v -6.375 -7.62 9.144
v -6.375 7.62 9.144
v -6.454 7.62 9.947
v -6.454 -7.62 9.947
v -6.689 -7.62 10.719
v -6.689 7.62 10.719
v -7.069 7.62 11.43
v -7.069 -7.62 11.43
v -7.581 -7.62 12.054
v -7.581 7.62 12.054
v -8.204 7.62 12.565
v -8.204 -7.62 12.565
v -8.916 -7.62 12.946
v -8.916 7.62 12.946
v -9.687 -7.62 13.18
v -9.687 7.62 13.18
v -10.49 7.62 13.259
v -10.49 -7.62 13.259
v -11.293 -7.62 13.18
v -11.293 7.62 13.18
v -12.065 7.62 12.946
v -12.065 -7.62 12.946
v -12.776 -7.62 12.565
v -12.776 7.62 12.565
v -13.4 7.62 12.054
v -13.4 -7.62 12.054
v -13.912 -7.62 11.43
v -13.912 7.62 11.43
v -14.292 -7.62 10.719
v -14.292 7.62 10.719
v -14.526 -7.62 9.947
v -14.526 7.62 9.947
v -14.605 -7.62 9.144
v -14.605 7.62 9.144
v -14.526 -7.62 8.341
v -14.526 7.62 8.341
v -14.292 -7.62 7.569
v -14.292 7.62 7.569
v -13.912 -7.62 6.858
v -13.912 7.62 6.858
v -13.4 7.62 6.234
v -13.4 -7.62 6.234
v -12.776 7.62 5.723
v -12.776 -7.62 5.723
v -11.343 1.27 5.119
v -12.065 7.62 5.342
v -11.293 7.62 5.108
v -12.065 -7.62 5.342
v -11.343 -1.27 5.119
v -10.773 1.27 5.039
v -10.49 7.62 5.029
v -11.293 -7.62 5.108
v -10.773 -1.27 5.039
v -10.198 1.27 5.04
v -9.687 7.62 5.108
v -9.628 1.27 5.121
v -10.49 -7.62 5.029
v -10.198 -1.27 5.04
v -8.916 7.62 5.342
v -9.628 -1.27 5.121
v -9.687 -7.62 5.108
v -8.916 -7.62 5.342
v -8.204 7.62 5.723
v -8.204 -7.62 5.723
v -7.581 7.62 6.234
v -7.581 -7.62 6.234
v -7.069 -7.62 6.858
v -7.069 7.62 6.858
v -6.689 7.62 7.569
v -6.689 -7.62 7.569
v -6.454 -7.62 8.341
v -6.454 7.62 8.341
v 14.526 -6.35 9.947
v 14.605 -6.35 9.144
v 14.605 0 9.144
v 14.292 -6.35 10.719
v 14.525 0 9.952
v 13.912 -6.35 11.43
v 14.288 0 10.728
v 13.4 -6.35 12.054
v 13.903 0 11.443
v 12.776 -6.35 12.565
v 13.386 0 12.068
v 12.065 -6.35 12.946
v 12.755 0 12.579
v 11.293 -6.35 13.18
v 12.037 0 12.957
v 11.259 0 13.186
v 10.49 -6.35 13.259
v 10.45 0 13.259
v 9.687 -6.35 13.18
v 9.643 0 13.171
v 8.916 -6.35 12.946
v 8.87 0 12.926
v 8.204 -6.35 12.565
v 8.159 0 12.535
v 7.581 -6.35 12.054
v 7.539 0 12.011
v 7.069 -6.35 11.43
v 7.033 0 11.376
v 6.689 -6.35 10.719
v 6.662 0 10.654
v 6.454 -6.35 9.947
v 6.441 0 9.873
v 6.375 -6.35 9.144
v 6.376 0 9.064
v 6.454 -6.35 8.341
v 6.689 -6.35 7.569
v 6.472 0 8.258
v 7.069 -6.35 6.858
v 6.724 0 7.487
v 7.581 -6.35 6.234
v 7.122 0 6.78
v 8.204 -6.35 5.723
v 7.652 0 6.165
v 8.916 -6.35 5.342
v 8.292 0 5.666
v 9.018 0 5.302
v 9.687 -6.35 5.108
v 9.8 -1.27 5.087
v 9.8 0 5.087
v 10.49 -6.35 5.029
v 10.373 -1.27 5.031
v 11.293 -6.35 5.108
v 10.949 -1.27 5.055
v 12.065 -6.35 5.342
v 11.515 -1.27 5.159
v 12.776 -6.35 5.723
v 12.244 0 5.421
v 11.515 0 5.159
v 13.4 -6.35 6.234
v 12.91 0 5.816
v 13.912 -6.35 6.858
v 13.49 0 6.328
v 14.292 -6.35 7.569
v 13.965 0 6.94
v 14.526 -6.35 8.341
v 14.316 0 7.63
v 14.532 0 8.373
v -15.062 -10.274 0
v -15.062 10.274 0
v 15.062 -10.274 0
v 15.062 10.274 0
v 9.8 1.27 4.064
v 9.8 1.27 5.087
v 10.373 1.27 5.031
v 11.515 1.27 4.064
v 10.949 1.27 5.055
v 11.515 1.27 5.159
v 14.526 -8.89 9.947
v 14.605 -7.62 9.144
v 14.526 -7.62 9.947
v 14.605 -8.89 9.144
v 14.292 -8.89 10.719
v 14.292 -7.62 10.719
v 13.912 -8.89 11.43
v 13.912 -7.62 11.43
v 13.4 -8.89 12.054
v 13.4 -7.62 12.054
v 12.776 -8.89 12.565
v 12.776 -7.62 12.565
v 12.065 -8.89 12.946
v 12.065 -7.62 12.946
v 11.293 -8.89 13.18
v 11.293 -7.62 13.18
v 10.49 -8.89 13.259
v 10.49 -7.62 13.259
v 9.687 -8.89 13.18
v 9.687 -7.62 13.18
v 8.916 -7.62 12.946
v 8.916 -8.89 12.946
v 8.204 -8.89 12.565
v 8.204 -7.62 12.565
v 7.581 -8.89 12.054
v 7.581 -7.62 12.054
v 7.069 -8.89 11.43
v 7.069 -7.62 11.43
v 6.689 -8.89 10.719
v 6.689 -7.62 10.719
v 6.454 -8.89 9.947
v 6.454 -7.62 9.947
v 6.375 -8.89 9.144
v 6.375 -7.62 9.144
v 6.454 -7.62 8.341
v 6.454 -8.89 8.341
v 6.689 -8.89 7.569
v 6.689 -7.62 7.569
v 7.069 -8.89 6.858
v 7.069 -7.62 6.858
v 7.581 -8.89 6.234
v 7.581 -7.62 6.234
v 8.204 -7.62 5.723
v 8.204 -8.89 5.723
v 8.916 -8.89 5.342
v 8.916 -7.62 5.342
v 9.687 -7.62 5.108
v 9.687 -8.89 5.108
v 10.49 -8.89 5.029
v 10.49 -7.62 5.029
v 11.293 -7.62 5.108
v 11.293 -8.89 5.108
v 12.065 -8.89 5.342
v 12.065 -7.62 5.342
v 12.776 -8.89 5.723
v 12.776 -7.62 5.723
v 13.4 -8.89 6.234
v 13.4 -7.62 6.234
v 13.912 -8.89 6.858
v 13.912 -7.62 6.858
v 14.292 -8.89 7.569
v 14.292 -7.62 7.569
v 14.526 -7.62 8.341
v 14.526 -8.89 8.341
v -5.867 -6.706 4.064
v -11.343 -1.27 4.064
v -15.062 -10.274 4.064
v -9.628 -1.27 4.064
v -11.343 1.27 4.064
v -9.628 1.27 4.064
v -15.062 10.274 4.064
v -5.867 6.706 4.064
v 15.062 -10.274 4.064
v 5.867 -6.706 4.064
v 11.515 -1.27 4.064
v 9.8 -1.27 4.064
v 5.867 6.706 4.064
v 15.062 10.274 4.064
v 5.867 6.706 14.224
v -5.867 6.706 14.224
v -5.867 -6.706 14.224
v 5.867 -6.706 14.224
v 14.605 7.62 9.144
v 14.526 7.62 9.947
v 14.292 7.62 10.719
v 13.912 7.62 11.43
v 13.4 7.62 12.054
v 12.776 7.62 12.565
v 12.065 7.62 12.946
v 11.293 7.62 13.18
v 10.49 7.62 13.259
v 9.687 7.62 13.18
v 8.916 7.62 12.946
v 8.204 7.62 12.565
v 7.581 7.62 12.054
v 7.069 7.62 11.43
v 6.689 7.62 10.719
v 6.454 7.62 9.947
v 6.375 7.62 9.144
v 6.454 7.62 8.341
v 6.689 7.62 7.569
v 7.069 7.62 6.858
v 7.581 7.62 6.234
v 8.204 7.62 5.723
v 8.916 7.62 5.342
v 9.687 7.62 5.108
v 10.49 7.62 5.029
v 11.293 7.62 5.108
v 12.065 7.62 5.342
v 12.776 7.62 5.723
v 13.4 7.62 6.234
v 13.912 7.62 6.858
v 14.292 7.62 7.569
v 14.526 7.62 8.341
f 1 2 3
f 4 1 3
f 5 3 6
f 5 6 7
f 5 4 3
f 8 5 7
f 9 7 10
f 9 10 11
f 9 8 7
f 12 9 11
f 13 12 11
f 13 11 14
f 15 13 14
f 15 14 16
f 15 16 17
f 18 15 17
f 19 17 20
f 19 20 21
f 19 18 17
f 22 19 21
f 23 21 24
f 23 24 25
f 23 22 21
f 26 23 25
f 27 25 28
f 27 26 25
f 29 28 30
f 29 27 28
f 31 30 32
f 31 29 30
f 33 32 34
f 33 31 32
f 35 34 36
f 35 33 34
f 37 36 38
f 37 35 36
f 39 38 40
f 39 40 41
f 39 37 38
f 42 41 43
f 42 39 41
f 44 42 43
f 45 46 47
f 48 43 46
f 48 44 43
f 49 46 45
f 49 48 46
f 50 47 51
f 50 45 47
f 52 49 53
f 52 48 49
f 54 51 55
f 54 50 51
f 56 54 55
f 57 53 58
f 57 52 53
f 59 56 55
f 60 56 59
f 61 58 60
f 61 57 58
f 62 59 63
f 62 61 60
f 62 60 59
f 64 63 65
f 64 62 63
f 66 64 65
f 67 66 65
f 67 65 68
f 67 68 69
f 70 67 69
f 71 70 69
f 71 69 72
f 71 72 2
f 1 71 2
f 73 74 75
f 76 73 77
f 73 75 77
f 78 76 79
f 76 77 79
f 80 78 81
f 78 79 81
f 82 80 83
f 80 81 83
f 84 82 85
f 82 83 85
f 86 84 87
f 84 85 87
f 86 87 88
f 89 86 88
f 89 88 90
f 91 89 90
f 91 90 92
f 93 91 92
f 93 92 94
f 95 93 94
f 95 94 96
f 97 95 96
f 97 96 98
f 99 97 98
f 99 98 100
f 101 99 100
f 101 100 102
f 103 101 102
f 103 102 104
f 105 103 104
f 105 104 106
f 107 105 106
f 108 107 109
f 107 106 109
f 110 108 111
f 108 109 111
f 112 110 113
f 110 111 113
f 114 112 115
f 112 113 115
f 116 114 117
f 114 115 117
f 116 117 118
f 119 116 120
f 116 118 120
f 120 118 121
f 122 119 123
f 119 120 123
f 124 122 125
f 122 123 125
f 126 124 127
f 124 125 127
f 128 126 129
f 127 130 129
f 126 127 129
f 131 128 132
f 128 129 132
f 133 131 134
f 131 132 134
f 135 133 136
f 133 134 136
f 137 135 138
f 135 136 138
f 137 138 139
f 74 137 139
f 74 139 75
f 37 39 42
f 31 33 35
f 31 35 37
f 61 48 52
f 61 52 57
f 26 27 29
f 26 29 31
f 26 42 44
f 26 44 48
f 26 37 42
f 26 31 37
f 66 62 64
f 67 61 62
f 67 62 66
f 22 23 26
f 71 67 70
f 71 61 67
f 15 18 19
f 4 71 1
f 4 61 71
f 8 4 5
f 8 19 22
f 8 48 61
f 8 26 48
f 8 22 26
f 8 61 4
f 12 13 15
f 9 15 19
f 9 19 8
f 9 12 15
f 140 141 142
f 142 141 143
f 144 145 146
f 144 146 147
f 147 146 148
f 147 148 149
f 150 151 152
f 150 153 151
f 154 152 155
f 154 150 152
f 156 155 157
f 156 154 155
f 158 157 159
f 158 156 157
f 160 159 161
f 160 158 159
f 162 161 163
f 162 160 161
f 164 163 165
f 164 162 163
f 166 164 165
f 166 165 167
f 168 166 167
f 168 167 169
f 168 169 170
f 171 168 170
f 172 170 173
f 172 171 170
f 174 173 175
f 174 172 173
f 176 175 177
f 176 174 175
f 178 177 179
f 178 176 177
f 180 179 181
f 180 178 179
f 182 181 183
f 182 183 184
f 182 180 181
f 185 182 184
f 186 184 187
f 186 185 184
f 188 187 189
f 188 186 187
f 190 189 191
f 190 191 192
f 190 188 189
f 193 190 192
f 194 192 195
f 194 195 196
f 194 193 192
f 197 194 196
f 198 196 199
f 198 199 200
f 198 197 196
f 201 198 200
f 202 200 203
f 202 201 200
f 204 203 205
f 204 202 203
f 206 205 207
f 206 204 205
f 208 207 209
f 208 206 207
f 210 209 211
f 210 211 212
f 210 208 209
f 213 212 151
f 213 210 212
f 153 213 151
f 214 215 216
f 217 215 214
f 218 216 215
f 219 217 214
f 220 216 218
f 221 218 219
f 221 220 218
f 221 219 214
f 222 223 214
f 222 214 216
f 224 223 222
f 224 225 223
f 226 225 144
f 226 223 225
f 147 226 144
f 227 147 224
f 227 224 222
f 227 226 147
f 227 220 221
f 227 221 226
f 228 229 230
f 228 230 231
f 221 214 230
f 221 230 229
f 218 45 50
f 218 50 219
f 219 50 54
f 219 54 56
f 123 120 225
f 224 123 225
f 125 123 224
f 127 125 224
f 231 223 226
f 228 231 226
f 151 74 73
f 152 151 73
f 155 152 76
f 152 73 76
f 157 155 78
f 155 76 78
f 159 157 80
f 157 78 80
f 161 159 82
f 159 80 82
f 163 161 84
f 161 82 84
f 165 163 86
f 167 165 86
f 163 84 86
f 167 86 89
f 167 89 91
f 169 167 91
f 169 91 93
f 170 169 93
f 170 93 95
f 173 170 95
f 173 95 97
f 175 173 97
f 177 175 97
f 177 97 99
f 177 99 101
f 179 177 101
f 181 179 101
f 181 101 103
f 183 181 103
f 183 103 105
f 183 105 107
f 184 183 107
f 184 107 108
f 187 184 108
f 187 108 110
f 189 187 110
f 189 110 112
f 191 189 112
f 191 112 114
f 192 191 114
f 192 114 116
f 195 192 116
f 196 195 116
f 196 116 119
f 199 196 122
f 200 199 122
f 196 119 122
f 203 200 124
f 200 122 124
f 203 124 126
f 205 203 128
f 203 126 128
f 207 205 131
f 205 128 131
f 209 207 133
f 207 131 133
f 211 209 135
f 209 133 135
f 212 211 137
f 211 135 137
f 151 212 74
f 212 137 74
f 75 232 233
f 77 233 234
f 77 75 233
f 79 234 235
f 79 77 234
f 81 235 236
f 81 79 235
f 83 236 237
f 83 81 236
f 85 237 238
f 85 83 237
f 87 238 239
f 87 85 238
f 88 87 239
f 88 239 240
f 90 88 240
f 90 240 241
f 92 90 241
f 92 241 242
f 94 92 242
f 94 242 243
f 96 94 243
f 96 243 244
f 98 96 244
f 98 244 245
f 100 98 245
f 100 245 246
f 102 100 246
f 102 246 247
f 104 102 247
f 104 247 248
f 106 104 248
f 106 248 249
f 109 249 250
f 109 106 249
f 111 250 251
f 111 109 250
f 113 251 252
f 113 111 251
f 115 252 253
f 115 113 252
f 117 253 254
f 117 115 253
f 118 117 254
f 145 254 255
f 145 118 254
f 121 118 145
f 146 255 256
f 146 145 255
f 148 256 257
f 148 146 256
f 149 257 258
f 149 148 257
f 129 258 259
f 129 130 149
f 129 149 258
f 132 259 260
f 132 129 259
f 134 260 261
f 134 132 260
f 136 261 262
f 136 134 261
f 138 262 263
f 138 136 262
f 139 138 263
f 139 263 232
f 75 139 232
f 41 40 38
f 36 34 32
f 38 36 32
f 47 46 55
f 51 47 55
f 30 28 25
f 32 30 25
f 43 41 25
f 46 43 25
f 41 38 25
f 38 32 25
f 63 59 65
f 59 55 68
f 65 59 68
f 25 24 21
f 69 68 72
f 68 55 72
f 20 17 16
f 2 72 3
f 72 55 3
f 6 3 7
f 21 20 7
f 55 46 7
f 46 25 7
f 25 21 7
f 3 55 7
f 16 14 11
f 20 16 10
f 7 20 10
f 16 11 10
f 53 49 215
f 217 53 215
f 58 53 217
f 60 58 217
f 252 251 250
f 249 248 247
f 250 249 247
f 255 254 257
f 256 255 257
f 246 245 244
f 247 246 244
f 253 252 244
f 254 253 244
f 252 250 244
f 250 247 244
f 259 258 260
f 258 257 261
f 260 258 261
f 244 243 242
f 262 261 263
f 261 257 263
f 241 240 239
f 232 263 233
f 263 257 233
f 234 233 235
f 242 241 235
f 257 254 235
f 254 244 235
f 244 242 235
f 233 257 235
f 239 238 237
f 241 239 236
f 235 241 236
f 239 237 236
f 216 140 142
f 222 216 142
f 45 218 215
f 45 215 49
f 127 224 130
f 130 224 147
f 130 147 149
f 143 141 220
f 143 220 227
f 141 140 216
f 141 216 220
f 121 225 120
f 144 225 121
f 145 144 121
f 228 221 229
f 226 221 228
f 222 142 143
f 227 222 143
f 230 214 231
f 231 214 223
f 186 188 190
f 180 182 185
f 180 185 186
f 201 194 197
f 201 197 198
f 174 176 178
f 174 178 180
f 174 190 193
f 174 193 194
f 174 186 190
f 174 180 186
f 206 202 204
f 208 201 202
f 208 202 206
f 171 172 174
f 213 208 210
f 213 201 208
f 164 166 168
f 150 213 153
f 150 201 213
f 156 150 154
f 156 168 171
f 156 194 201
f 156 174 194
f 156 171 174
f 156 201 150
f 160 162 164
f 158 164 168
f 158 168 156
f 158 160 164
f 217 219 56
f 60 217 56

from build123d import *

# Parameters (mm, degrees)
F0_W      = 30.1244
F0_H      = 20.5486
F1_DEPTH  = 4.064
F2_W      = 11.7348
F2_H      = 13.4112
F3_DEPTH  = 10.16
F4_R      = 4.1148
F5_DEPTH  = 7.62
F6_W      = 1.714757
F6_H      = 6.894373
F6_H_2    = 6.894372
F5_FACE_R = 4.1148
F7_DEPTH  = 1.27


with BuildPart() as f1:
    # F0 (on Top) → F1 (new body)
    with BuildSketch(Plane.XY):
        Rectangle(F0_W, F0_H)
    extrude(amount=F1_DEPTH)

    # F2 (on face) → F3 (join)
    with BuildSketch(Plane.XY.offset(4.064)):
        Rectangle(F2_W, F2_H)
    extrude(amount=F3_DEPTH)



with BuildPart() as f5:
    # F4 (on Front) → F5 (new body, symmetric)
    with BuildSketch(Plane.XZ):
        with Locations((10.4902, 9.144)):
            Circle(F4_R)
        with Locations((-10.4902, 9.144)):
            Circle(F4_R)
    extrude(amount=F5_DEPTH, both=True)


with BuildPart() as f1_1:
    add(f1.part)

    add(f5.part)  # F7 merges F5
    # F6 (on Front) + F5_face (on face) → F7 (join, symmetric)
    with BuildSketch(Plane.XZ):
        with Locations((-10.485539, 5.029202)):
            Rectangle(F6_W, F6_H)
        with Locations((10.657787, 5.032614)):
            Rectangle(F6_W, F6_H_2)
    with BuildSketch(Plane(origin=(10.4902, -7.62, 9.144), x_dir=(1, 0, 0), z_dir=(0, -1, 0))):
        Circle(F5_FACE_R)
    extrude(amount=F7_DEPTH, both=True)


solid = f1_1.part
